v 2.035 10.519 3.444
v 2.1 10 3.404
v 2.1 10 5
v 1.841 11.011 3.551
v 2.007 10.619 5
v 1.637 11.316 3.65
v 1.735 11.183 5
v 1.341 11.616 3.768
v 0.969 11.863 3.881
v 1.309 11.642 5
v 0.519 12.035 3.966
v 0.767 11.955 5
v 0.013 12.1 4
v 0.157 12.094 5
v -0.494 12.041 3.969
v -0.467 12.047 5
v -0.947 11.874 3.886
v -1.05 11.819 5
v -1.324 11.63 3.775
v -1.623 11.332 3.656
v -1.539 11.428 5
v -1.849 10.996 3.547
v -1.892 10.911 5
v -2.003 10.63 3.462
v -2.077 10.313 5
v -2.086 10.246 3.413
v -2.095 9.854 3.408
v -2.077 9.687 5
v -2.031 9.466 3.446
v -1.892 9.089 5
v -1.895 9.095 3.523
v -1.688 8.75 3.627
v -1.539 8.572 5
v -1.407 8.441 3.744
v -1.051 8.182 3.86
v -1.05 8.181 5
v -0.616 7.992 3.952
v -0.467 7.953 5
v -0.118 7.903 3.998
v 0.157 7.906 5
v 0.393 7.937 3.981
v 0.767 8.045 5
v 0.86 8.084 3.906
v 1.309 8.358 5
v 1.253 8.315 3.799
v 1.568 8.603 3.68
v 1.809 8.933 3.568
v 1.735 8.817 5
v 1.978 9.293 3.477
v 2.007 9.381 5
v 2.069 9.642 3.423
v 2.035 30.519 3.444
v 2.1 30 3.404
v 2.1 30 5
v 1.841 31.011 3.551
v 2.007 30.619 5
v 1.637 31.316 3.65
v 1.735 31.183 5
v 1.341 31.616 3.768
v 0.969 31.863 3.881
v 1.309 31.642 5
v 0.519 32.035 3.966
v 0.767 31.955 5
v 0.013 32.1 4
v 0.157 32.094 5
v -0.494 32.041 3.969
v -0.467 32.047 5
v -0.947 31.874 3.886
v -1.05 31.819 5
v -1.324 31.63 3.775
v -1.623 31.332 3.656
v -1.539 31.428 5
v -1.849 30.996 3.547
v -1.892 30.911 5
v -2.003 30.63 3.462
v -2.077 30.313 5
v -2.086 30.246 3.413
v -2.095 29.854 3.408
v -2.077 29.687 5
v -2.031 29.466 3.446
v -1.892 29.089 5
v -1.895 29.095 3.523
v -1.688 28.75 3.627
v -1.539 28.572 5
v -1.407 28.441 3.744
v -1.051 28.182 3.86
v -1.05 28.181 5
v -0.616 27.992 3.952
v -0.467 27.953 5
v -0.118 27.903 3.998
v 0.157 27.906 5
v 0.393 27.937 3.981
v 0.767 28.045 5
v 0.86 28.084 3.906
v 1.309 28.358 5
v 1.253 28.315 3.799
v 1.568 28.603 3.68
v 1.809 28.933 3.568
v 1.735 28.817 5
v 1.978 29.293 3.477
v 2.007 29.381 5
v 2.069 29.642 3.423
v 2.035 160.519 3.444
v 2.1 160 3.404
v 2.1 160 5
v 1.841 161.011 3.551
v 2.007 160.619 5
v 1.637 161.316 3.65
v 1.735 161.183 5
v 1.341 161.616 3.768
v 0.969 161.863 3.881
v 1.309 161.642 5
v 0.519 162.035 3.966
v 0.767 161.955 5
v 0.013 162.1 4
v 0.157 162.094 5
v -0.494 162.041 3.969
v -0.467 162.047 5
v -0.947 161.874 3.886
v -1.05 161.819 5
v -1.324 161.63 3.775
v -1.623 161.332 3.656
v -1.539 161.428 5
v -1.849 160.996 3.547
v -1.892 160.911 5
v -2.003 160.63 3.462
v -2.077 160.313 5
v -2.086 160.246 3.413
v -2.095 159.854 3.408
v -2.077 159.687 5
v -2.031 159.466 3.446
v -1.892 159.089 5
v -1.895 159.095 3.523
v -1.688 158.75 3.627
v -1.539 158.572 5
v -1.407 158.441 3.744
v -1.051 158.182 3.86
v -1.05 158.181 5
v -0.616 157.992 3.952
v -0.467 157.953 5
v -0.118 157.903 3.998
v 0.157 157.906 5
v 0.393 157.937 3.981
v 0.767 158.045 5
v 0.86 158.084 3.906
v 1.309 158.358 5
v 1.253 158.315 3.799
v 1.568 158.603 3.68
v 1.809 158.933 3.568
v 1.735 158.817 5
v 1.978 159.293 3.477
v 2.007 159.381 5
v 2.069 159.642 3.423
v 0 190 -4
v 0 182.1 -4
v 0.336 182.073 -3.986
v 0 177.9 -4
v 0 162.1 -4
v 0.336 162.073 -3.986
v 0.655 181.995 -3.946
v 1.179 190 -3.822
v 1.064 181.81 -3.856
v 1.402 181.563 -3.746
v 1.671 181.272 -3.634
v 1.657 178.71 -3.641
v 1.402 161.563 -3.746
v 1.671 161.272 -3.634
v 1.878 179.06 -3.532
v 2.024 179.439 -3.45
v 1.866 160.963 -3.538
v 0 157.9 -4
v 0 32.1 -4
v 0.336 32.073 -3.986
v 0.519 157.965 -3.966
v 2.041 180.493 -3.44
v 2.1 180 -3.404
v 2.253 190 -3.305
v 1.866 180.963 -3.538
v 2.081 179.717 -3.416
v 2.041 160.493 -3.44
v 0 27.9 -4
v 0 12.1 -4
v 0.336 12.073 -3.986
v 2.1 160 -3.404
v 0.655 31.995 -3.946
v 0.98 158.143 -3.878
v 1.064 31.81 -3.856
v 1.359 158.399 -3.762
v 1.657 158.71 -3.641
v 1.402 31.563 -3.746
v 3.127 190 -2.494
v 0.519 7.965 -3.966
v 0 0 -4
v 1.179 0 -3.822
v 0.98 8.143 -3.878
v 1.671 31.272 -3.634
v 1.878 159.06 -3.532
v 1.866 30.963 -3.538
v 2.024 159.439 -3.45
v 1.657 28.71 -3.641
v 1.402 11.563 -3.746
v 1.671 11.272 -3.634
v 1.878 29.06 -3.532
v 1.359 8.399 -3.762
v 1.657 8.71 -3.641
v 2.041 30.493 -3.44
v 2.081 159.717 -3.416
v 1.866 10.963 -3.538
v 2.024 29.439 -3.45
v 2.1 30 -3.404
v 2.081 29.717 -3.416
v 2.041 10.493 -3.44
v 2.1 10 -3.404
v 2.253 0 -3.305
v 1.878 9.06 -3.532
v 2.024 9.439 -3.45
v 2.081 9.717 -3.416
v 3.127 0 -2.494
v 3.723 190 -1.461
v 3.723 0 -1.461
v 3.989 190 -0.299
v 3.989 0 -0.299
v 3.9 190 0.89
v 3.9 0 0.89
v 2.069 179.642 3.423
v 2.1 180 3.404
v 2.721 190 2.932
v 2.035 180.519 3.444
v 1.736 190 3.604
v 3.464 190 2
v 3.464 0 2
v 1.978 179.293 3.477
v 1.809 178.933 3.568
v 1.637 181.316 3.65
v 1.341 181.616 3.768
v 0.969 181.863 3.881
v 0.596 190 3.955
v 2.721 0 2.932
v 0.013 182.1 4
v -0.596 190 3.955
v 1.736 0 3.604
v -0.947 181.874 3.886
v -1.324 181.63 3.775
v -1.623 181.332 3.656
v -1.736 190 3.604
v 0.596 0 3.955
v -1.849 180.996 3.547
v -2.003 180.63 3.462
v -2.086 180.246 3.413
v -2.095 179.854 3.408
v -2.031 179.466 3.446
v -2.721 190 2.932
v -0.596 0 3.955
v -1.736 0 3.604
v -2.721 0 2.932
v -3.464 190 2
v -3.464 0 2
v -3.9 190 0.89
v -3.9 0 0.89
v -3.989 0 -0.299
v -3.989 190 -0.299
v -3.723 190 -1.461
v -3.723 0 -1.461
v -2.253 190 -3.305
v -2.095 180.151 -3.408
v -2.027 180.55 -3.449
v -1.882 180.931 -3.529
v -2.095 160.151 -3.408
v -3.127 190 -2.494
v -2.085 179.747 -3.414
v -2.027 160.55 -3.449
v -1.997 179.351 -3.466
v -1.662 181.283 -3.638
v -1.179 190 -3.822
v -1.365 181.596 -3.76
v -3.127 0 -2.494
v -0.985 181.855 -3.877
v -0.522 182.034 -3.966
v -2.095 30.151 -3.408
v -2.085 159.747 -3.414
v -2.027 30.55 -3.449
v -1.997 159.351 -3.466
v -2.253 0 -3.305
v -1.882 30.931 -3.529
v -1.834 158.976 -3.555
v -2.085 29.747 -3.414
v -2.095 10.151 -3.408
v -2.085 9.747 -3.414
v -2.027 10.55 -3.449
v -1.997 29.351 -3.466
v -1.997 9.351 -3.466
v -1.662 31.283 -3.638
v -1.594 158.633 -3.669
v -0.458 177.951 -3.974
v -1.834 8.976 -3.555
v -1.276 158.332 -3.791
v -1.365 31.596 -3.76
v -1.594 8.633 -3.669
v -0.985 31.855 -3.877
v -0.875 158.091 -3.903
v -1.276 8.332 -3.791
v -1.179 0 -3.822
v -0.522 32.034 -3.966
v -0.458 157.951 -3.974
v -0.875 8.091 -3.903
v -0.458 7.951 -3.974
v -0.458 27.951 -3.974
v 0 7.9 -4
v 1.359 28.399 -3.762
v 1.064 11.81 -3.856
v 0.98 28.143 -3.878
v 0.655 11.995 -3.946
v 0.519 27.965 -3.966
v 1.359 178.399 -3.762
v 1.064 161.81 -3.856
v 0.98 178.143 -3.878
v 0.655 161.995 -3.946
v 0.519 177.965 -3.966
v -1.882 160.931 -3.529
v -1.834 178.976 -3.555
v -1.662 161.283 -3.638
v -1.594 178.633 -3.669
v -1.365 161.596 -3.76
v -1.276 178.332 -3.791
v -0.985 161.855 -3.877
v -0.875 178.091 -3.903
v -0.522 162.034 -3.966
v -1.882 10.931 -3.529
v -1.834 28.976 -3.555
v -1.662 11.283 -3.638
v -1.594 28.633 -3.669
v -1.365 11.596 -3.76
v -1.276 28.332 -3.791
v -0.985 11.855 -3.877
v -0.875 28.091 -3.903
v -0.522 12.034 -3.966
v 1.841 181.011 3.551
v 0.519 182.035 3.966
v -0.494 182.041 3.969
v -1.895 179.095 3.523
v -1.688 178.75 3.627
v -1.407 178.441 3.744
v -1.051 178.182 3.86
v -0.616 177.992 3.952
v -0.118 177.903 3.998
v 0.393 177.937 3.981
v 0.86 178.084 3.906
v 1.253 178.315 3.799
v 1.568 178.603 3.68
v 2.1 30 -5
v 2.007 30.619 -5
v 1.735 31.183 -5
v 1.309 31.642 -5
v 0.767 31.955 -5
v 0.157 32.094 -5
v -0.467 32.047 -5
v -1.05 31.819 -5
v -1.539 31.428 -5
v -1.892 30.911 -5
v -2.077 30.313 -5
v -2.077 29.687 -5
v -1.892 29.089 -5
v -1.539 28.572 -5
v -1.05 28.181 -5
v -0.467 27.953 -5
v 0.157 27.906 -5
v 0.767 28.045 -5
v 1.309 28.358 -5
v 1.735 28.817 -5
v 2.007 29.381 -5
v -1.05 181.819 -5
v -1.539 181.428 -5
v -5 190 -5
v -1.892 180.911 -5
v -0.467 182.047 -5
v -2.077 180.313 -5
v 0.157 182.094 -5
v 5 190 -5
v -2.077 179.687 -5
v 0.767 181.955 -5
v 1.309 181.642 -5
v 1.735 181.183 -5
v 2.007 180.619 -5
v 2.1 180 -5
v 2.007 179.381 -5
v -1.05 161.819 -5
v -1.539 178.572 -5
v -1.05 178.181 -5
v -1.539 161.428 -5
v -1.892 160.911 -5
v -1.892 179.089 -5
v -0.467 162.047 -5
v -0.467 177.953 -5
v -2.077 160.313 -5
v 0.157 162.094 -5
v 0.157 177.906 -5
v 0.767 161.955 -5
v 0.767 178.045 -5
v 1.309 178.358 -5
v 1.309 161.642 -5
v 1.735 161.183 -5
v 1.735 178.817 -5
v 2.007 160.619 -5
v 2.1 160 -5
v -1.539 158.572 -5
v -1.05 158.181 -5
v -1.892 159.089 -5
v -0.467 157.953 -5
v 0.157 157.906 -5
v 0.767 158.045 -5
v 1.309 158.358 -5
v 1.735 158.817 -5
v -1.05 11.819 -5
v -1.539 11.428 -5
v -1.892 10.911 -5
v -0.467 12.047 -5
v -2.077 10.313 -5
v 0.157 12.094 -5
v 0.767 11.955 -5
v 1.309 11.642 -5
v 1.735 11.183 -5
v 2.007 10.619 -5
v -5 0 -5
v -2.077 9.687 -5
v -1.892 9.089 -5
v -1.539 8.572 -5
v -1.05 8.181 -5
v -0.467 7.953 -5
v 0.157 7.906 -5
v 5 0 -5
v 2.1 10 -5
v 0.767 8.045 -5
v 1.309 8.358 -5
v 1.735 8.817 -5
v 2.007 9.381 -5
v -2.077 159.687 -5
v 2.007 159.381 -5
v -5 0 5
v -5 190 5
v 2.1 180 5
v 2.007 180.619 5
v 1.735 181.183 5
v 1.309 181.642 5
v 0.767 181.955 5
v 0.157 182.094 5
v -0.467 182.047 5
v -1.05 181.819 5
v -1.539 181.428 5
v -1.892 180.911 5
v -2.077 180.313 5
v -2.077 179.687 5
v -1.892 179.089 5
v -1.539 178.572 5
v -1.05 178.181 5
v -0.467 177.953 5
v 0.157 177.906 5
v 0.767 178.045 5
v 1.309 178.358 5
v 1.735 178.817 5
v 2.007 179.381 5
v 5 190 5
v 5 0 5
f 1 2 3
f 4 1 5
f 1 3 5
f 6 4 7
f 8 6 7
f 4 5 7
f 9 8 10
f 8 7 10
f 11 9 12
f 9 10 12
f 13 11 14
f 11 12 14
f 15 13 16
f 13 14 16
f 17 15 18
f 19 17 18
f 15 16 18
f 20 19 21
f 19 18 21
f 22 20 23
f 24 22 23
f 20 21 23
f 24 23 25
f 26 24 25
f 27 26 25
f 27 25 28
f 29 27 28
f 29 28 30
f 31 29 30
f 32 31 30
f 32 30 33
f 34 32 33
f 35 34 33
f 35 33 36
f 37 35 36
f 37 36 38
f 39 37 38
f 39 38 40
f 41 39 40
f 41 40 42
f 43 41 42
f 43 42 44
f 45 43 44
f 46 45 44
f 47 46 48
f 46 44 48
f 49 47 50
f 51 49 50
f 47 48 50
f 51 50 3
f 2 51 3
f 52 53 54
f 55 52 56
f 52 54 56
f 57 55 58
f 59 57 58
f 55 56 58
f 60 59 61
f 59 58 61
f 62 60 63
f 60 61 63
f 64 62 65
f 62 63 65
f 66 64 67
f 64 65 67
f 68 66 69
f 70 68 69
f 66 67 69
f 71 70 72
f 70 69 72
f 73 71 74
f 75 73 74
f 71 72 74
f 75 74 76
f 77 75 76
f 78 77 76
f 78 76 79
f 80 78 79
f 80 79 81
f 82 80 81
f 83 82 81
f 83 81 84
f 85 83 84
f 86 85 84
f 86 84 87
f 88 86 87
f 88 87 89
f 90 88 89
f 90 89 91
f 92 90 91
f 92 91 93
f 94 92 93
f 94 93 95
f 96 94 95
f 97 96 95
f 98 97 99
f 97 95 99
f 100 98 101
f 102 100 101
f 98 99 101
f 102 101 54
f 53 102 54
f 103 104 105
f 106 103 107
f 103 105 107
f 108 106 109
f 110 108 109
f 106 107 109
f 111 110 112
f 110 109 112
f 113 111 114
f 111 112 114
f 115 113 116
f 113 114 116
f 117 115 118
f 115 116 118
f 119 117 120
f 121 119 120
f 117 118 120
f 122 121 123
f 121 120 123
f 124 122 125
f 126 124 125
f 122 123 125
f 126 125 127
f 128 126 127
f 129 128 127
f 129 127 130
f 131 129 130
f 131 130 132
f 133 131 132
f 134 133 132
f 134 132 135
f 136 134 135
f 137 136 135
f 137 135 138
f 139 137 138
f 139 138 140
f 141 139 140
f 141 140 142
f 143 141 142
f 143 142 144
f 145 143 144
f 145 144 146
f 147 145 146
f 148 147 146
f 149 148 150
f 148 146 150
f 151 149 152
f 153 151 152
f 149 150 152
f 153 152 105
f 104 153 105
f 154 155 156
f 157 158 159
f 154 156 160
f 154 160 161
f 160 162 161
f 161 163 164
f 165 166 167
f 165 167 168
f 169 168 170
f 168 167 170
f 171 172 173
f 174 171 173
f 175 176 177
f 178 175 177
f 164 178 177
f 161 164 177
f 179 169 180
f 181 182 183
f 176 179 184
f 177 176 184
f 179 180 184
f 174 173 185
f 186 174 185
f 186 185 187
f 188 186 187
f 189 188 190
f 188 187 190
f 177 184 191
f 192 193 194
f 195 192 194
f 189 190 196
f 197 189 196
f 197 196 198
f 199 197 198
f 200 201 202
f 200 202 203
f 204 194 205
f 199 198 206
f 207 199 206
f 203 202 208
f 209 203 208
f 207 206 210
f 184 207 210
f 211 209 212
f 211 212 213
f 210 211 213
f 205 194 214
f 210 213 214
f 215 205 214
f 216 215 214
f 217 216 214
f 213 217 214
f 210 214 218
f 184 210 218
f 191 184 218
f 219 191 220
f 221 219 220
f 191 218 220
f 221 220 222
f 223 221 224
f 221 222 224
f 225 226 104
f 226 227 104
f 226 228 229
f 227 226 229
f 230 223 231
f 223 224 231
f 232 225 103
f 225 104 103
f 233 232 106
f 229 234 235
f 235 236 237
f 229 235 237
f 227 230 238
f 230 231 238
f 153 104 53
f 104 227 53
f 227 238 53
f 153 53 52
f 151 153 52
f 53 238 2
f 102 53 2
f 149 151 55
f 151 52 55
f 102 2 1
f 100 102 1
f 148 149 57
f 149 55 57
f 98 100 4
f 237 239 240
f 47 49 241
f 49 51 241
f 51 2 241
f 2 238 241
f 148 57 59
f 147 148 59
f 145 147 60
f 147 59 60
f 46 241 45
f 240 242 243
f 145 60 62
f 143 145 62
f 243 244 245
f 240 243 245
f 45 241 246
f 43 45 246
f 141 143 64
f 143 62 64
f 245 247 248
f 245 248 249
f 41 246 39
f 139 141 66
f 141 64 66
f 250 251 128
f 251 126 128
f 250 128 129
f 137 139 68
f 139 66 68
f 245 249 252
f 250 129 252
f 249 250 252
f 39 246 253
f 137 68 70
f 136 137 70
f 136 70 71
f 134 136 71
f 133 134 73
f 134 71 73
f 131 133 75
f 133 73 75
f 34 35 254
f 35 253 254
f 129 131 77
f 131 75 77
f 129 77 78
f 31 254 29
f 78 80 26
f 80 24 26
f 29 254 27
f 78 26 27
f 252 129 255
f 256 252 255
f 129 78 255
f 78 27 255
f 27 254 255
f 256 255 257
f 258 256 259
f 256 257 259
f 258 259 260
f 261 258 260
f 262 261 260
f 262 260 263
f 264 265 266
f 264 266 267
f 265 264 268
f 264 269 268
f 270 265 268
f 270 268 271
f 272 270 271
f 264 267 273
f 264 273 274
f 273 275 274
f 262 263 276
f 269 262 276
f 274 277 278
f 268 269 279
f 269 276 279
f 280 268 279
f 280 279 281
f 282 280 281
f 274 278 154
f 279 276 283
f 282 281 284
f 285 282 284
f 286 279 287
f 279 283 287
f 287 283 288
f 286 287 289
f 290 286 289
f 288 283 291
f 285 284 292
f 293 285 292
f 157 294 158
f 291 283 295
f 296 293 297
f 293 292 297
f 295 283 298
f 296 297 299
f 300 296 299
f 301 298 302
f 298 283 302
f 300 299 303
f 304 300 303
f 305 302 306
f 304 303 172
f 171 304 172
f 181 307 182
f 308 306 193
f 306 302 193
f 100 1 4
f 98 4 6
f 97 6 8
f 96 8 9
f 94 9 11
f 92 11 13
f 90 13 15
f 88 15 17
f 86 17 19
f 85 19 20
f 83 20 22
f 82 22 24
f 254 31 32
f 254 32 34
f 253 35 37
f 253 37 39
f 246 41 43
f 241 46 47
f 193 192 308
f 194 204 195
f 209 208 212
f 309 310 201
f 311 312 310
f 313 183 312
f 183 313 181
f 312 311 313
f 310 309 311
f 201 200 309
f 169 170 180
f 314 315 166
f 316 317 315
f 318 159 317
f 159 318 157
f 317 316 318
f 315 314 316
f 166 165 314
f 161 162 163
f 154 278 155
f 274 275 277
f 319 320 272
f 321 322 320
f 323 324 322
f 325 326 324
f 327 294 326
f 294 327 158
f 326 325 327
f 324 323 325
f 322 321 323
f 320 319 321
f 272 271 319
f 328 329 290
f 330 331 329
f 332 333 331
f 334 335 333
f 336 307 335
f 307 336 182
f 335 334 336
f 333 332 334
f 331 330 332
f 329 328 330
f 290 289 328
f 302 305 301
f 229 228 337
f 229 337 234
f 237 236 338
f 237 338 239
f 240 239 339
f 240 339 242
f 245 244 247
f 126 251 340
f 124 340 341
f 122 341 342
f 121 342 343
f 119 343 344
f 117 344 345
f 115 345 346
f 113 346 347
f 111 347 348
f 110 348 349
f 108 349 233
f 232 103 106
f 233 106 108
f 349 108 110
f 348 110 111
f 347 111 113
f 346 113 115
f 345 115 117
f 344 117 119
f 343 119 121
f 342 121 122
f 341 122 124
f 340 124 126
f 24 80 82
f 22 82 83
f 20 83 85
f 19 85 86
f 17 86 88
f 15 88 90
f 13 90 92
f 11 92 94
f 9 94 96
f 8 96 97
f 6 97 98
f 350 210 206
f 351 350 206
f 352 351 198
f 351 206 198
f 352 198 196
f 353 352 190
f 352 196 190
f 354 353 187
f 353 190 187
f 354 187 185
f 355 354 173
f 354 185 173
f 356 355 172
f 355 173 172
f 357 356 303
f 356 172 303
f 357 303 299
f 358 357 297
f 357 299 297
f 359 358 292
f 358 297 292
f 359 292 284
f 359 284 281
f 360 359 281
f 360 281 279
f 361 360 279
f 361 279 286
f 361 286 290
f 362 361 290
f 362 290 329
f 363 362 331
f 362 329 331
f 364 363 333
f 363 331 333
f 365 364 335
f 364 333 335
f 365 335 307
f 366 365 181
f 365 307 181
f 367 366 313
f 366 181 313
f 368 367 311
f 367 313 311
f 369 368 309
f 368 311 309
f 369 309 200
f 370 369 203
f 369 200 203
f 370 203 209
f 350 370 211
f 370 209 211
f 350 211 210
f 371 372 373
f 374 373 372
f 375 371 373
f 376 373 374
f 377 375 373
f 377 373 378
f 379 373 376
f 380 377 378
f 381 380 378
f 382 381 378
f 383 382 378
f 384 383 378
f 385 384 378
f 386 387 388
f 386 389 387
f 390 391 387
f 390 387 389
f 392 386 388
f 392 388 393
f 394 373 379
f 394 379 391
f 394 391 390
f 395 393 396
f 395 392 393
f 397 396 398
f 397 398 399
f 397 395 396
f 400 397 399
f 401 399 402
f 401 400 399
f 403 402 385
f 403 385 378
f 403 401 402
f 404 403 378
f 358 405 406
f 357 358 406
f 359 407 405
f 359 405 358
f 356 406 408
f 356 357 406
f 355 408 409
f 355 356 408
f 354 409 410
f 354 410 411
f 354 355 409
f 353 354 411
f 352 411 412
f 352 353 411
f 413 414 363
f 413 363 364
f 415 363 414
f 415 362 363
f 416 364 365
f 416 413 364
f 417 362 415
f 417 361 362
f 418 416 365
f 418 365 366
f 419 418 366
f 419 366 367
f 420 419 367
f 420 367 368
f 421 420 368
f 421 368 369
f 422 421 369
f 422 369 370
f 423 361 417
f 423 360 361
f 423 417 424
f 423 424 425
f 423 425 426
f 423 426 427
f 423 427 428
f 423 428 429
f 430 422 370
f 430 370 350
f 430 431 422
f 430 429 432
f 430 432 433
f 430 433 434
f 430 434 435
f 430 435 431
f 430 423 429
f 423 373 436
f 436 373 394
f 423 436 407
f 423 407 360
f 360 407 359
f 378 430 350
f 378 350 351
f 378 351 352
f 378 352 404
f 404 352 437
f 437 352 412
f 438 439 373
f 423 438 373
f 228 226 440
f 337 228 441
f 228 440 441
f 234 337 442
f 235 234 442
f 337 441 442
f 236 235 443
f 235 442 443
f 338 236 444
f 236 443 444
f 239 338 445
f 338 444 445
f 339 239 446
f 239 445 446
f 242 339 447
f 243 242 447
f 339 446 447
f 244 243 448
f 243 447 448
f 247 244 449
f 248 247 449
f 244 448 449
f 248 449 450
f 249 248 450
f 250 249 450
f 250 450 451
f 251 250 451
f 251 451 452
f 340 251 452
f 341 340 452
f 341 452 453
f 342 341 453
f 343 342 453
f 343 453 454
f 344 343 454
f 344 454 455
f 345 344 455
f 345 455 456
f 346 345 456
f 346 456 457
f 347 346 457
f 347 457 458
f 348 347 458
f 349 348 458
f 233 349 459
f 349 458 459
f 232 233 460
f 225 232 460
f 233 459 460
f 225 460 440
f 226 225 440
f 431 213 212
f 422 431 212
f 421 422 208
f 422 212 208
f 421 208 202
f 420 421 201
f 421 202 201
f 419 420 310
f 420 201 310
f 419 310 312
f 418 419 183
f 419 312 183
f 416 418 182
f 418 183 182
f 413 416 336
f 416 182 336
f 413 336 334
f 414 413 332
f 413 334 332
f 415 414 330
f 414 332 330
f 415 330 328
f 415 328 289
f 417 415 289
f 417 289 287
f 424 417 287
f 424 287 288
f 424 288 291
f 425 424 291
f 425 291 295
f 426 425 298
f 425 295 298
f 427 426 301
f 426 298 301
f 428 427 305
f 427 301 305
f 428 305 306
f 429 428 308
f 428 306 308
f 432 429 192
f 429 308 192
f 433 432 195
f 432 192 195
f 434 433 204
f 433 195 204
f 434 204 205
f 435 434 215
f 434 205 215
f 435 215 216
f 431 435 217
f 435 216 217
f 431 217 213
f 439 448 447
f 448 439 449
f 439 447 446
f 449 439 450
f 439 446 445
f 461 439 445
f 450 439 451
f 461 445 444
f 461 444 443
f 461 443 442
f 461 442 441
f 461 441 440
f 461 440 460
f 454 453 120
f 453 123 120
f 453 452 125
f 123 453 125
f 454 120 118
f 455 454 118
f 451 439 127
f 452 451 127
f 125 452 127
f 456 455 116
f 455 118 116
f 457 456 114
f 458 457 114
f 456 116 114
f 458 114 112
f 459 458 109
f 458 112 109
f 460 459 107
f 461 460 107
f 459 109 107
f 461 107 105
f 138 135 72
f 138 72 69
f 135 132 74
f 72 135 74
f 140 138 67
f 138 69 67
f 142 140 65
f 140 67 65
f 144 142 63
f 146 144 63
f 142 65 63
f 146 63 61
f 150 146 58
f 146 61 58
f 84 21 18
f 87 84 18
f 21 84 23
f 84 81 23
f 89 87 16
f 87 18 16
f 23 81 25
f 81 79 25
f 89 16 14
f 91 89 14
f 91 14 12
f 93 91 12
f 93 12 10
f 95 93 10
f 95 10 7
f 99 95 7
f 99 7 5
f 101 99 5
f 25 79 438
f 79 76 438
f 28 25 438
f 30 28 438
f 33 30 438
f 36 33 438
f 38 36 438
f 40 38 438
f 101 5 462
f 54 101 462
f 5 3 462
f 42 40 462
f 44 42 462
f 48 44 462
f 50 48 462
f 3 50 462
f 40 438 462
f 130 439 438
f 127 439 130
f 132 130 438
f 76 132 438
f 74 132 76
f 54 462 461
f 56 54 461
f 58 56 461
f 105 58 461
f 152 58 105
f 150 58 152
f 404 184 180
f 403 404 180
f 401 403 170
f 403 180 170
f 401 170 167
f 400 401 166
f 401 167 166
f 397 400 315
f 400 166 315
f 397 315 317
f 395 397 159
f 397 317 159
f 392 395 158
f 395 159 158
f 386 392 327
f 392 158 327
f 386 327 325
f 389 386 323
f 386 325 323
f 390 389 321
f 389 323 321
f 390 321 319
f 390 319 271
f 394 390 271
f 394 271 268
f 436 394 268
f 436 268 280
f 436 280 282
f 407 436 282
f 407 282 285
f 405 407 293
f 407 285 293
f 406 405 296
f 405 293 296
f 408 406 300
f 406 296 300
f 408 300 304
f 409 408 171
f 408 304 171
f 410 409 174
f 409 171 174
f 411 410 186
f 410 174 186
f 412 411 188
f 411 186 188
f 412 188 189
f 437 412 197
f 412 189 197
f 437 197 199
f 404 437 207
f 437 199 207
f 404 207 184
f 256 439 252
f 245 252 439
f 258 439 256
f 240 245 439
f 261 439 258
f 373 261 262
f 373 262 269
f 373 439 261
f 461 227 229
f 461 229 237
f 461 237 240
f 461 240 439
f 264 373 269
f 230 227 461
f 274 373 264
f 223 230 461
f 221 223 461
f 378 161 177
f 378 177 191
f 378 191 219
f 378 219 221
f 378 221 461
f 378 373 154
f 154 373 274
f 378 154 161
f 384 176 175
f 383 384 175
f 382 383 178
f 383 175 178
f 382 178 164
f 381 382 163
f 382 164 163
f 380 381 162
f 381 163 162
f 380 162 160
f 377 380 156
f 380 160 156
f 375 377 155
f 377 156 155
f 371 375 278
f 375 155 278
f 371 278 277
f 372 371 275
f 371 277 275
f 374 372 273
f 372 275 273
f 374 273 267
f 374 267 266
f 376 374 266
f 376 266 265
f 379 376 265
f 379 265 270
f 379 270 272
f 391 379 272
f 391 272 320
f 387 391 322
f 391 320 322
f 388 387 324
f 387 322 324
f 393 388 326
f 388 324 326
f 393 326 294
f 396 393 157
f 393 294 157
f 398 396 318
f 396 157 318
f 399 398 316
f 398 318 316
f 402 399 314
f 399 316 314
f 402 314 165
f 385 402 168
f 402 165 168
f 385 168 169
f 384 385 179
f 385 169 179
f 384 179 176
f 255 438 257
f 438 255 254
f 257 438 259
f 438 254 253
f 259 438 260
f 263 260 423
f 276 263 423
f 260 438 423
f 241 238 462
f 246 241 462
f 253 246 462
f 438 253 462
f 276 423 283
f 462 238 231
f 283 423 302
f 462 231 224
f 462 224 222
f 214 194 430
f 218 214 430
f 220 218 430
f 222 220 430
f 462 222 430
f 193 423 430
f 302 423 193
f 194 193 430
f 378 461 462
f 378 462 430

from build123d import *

# Parameters (mm, degrees)
SKETCH_1_W          = 10
SKETCH_1_H          = 10
EXTRUDE_1_DEPTH     = 190
SKETCH_2_R          = 2.1
CUT_EXTRUDE_1_DEPTH = 200
SKETCH_3_R          = 4
CUT_EXTRUDE_2_DEPTH = 191.131533418


with BuildPart() as part:
    # 草图1 → 凸台-拉伸1 (new body)
    with BuildSketch(Plane(origin=(0, 0, 0), x_dir=(1, 0, 0), z_dir=(0, 1, 0))):
        Rectangle(SKETCH_1_W, SKETCH_1_H)
    extrude(amount=EXTRUDE_1_DEPTH)

    # 草图2 → 切除-拉伸1 (cut)
    with BuildSketch(Plane.XY.offset(5)):
        with Locations((0, 10)):
            Circle(SKETCH_2_R)
        with Locations((0, 30)):
            Circle(SKETCH_2_R)
        with Locations((0, 180)):
            Circle(SKETCH_2_R)
        with Locations((0, 160)):
            Circle(SKETCH_2_R)
    extrude(amount=-CUT_EXTRUDE_1_DEPTH, mode=Mode.SUBTRACT)

    # 草图3 → 切除-拉伸2 (cut, through all)
    with BuildSketch(Plane.XZ):
        with Locations(Location((0, 0, 0), (0, 0, 270))):
            Circle(SKETCH_3_R)
    extrude(amount=-CUT_EXTRUDE_2_DEPTH, mode=Mode.SUBTRACT)


solid = part.part
